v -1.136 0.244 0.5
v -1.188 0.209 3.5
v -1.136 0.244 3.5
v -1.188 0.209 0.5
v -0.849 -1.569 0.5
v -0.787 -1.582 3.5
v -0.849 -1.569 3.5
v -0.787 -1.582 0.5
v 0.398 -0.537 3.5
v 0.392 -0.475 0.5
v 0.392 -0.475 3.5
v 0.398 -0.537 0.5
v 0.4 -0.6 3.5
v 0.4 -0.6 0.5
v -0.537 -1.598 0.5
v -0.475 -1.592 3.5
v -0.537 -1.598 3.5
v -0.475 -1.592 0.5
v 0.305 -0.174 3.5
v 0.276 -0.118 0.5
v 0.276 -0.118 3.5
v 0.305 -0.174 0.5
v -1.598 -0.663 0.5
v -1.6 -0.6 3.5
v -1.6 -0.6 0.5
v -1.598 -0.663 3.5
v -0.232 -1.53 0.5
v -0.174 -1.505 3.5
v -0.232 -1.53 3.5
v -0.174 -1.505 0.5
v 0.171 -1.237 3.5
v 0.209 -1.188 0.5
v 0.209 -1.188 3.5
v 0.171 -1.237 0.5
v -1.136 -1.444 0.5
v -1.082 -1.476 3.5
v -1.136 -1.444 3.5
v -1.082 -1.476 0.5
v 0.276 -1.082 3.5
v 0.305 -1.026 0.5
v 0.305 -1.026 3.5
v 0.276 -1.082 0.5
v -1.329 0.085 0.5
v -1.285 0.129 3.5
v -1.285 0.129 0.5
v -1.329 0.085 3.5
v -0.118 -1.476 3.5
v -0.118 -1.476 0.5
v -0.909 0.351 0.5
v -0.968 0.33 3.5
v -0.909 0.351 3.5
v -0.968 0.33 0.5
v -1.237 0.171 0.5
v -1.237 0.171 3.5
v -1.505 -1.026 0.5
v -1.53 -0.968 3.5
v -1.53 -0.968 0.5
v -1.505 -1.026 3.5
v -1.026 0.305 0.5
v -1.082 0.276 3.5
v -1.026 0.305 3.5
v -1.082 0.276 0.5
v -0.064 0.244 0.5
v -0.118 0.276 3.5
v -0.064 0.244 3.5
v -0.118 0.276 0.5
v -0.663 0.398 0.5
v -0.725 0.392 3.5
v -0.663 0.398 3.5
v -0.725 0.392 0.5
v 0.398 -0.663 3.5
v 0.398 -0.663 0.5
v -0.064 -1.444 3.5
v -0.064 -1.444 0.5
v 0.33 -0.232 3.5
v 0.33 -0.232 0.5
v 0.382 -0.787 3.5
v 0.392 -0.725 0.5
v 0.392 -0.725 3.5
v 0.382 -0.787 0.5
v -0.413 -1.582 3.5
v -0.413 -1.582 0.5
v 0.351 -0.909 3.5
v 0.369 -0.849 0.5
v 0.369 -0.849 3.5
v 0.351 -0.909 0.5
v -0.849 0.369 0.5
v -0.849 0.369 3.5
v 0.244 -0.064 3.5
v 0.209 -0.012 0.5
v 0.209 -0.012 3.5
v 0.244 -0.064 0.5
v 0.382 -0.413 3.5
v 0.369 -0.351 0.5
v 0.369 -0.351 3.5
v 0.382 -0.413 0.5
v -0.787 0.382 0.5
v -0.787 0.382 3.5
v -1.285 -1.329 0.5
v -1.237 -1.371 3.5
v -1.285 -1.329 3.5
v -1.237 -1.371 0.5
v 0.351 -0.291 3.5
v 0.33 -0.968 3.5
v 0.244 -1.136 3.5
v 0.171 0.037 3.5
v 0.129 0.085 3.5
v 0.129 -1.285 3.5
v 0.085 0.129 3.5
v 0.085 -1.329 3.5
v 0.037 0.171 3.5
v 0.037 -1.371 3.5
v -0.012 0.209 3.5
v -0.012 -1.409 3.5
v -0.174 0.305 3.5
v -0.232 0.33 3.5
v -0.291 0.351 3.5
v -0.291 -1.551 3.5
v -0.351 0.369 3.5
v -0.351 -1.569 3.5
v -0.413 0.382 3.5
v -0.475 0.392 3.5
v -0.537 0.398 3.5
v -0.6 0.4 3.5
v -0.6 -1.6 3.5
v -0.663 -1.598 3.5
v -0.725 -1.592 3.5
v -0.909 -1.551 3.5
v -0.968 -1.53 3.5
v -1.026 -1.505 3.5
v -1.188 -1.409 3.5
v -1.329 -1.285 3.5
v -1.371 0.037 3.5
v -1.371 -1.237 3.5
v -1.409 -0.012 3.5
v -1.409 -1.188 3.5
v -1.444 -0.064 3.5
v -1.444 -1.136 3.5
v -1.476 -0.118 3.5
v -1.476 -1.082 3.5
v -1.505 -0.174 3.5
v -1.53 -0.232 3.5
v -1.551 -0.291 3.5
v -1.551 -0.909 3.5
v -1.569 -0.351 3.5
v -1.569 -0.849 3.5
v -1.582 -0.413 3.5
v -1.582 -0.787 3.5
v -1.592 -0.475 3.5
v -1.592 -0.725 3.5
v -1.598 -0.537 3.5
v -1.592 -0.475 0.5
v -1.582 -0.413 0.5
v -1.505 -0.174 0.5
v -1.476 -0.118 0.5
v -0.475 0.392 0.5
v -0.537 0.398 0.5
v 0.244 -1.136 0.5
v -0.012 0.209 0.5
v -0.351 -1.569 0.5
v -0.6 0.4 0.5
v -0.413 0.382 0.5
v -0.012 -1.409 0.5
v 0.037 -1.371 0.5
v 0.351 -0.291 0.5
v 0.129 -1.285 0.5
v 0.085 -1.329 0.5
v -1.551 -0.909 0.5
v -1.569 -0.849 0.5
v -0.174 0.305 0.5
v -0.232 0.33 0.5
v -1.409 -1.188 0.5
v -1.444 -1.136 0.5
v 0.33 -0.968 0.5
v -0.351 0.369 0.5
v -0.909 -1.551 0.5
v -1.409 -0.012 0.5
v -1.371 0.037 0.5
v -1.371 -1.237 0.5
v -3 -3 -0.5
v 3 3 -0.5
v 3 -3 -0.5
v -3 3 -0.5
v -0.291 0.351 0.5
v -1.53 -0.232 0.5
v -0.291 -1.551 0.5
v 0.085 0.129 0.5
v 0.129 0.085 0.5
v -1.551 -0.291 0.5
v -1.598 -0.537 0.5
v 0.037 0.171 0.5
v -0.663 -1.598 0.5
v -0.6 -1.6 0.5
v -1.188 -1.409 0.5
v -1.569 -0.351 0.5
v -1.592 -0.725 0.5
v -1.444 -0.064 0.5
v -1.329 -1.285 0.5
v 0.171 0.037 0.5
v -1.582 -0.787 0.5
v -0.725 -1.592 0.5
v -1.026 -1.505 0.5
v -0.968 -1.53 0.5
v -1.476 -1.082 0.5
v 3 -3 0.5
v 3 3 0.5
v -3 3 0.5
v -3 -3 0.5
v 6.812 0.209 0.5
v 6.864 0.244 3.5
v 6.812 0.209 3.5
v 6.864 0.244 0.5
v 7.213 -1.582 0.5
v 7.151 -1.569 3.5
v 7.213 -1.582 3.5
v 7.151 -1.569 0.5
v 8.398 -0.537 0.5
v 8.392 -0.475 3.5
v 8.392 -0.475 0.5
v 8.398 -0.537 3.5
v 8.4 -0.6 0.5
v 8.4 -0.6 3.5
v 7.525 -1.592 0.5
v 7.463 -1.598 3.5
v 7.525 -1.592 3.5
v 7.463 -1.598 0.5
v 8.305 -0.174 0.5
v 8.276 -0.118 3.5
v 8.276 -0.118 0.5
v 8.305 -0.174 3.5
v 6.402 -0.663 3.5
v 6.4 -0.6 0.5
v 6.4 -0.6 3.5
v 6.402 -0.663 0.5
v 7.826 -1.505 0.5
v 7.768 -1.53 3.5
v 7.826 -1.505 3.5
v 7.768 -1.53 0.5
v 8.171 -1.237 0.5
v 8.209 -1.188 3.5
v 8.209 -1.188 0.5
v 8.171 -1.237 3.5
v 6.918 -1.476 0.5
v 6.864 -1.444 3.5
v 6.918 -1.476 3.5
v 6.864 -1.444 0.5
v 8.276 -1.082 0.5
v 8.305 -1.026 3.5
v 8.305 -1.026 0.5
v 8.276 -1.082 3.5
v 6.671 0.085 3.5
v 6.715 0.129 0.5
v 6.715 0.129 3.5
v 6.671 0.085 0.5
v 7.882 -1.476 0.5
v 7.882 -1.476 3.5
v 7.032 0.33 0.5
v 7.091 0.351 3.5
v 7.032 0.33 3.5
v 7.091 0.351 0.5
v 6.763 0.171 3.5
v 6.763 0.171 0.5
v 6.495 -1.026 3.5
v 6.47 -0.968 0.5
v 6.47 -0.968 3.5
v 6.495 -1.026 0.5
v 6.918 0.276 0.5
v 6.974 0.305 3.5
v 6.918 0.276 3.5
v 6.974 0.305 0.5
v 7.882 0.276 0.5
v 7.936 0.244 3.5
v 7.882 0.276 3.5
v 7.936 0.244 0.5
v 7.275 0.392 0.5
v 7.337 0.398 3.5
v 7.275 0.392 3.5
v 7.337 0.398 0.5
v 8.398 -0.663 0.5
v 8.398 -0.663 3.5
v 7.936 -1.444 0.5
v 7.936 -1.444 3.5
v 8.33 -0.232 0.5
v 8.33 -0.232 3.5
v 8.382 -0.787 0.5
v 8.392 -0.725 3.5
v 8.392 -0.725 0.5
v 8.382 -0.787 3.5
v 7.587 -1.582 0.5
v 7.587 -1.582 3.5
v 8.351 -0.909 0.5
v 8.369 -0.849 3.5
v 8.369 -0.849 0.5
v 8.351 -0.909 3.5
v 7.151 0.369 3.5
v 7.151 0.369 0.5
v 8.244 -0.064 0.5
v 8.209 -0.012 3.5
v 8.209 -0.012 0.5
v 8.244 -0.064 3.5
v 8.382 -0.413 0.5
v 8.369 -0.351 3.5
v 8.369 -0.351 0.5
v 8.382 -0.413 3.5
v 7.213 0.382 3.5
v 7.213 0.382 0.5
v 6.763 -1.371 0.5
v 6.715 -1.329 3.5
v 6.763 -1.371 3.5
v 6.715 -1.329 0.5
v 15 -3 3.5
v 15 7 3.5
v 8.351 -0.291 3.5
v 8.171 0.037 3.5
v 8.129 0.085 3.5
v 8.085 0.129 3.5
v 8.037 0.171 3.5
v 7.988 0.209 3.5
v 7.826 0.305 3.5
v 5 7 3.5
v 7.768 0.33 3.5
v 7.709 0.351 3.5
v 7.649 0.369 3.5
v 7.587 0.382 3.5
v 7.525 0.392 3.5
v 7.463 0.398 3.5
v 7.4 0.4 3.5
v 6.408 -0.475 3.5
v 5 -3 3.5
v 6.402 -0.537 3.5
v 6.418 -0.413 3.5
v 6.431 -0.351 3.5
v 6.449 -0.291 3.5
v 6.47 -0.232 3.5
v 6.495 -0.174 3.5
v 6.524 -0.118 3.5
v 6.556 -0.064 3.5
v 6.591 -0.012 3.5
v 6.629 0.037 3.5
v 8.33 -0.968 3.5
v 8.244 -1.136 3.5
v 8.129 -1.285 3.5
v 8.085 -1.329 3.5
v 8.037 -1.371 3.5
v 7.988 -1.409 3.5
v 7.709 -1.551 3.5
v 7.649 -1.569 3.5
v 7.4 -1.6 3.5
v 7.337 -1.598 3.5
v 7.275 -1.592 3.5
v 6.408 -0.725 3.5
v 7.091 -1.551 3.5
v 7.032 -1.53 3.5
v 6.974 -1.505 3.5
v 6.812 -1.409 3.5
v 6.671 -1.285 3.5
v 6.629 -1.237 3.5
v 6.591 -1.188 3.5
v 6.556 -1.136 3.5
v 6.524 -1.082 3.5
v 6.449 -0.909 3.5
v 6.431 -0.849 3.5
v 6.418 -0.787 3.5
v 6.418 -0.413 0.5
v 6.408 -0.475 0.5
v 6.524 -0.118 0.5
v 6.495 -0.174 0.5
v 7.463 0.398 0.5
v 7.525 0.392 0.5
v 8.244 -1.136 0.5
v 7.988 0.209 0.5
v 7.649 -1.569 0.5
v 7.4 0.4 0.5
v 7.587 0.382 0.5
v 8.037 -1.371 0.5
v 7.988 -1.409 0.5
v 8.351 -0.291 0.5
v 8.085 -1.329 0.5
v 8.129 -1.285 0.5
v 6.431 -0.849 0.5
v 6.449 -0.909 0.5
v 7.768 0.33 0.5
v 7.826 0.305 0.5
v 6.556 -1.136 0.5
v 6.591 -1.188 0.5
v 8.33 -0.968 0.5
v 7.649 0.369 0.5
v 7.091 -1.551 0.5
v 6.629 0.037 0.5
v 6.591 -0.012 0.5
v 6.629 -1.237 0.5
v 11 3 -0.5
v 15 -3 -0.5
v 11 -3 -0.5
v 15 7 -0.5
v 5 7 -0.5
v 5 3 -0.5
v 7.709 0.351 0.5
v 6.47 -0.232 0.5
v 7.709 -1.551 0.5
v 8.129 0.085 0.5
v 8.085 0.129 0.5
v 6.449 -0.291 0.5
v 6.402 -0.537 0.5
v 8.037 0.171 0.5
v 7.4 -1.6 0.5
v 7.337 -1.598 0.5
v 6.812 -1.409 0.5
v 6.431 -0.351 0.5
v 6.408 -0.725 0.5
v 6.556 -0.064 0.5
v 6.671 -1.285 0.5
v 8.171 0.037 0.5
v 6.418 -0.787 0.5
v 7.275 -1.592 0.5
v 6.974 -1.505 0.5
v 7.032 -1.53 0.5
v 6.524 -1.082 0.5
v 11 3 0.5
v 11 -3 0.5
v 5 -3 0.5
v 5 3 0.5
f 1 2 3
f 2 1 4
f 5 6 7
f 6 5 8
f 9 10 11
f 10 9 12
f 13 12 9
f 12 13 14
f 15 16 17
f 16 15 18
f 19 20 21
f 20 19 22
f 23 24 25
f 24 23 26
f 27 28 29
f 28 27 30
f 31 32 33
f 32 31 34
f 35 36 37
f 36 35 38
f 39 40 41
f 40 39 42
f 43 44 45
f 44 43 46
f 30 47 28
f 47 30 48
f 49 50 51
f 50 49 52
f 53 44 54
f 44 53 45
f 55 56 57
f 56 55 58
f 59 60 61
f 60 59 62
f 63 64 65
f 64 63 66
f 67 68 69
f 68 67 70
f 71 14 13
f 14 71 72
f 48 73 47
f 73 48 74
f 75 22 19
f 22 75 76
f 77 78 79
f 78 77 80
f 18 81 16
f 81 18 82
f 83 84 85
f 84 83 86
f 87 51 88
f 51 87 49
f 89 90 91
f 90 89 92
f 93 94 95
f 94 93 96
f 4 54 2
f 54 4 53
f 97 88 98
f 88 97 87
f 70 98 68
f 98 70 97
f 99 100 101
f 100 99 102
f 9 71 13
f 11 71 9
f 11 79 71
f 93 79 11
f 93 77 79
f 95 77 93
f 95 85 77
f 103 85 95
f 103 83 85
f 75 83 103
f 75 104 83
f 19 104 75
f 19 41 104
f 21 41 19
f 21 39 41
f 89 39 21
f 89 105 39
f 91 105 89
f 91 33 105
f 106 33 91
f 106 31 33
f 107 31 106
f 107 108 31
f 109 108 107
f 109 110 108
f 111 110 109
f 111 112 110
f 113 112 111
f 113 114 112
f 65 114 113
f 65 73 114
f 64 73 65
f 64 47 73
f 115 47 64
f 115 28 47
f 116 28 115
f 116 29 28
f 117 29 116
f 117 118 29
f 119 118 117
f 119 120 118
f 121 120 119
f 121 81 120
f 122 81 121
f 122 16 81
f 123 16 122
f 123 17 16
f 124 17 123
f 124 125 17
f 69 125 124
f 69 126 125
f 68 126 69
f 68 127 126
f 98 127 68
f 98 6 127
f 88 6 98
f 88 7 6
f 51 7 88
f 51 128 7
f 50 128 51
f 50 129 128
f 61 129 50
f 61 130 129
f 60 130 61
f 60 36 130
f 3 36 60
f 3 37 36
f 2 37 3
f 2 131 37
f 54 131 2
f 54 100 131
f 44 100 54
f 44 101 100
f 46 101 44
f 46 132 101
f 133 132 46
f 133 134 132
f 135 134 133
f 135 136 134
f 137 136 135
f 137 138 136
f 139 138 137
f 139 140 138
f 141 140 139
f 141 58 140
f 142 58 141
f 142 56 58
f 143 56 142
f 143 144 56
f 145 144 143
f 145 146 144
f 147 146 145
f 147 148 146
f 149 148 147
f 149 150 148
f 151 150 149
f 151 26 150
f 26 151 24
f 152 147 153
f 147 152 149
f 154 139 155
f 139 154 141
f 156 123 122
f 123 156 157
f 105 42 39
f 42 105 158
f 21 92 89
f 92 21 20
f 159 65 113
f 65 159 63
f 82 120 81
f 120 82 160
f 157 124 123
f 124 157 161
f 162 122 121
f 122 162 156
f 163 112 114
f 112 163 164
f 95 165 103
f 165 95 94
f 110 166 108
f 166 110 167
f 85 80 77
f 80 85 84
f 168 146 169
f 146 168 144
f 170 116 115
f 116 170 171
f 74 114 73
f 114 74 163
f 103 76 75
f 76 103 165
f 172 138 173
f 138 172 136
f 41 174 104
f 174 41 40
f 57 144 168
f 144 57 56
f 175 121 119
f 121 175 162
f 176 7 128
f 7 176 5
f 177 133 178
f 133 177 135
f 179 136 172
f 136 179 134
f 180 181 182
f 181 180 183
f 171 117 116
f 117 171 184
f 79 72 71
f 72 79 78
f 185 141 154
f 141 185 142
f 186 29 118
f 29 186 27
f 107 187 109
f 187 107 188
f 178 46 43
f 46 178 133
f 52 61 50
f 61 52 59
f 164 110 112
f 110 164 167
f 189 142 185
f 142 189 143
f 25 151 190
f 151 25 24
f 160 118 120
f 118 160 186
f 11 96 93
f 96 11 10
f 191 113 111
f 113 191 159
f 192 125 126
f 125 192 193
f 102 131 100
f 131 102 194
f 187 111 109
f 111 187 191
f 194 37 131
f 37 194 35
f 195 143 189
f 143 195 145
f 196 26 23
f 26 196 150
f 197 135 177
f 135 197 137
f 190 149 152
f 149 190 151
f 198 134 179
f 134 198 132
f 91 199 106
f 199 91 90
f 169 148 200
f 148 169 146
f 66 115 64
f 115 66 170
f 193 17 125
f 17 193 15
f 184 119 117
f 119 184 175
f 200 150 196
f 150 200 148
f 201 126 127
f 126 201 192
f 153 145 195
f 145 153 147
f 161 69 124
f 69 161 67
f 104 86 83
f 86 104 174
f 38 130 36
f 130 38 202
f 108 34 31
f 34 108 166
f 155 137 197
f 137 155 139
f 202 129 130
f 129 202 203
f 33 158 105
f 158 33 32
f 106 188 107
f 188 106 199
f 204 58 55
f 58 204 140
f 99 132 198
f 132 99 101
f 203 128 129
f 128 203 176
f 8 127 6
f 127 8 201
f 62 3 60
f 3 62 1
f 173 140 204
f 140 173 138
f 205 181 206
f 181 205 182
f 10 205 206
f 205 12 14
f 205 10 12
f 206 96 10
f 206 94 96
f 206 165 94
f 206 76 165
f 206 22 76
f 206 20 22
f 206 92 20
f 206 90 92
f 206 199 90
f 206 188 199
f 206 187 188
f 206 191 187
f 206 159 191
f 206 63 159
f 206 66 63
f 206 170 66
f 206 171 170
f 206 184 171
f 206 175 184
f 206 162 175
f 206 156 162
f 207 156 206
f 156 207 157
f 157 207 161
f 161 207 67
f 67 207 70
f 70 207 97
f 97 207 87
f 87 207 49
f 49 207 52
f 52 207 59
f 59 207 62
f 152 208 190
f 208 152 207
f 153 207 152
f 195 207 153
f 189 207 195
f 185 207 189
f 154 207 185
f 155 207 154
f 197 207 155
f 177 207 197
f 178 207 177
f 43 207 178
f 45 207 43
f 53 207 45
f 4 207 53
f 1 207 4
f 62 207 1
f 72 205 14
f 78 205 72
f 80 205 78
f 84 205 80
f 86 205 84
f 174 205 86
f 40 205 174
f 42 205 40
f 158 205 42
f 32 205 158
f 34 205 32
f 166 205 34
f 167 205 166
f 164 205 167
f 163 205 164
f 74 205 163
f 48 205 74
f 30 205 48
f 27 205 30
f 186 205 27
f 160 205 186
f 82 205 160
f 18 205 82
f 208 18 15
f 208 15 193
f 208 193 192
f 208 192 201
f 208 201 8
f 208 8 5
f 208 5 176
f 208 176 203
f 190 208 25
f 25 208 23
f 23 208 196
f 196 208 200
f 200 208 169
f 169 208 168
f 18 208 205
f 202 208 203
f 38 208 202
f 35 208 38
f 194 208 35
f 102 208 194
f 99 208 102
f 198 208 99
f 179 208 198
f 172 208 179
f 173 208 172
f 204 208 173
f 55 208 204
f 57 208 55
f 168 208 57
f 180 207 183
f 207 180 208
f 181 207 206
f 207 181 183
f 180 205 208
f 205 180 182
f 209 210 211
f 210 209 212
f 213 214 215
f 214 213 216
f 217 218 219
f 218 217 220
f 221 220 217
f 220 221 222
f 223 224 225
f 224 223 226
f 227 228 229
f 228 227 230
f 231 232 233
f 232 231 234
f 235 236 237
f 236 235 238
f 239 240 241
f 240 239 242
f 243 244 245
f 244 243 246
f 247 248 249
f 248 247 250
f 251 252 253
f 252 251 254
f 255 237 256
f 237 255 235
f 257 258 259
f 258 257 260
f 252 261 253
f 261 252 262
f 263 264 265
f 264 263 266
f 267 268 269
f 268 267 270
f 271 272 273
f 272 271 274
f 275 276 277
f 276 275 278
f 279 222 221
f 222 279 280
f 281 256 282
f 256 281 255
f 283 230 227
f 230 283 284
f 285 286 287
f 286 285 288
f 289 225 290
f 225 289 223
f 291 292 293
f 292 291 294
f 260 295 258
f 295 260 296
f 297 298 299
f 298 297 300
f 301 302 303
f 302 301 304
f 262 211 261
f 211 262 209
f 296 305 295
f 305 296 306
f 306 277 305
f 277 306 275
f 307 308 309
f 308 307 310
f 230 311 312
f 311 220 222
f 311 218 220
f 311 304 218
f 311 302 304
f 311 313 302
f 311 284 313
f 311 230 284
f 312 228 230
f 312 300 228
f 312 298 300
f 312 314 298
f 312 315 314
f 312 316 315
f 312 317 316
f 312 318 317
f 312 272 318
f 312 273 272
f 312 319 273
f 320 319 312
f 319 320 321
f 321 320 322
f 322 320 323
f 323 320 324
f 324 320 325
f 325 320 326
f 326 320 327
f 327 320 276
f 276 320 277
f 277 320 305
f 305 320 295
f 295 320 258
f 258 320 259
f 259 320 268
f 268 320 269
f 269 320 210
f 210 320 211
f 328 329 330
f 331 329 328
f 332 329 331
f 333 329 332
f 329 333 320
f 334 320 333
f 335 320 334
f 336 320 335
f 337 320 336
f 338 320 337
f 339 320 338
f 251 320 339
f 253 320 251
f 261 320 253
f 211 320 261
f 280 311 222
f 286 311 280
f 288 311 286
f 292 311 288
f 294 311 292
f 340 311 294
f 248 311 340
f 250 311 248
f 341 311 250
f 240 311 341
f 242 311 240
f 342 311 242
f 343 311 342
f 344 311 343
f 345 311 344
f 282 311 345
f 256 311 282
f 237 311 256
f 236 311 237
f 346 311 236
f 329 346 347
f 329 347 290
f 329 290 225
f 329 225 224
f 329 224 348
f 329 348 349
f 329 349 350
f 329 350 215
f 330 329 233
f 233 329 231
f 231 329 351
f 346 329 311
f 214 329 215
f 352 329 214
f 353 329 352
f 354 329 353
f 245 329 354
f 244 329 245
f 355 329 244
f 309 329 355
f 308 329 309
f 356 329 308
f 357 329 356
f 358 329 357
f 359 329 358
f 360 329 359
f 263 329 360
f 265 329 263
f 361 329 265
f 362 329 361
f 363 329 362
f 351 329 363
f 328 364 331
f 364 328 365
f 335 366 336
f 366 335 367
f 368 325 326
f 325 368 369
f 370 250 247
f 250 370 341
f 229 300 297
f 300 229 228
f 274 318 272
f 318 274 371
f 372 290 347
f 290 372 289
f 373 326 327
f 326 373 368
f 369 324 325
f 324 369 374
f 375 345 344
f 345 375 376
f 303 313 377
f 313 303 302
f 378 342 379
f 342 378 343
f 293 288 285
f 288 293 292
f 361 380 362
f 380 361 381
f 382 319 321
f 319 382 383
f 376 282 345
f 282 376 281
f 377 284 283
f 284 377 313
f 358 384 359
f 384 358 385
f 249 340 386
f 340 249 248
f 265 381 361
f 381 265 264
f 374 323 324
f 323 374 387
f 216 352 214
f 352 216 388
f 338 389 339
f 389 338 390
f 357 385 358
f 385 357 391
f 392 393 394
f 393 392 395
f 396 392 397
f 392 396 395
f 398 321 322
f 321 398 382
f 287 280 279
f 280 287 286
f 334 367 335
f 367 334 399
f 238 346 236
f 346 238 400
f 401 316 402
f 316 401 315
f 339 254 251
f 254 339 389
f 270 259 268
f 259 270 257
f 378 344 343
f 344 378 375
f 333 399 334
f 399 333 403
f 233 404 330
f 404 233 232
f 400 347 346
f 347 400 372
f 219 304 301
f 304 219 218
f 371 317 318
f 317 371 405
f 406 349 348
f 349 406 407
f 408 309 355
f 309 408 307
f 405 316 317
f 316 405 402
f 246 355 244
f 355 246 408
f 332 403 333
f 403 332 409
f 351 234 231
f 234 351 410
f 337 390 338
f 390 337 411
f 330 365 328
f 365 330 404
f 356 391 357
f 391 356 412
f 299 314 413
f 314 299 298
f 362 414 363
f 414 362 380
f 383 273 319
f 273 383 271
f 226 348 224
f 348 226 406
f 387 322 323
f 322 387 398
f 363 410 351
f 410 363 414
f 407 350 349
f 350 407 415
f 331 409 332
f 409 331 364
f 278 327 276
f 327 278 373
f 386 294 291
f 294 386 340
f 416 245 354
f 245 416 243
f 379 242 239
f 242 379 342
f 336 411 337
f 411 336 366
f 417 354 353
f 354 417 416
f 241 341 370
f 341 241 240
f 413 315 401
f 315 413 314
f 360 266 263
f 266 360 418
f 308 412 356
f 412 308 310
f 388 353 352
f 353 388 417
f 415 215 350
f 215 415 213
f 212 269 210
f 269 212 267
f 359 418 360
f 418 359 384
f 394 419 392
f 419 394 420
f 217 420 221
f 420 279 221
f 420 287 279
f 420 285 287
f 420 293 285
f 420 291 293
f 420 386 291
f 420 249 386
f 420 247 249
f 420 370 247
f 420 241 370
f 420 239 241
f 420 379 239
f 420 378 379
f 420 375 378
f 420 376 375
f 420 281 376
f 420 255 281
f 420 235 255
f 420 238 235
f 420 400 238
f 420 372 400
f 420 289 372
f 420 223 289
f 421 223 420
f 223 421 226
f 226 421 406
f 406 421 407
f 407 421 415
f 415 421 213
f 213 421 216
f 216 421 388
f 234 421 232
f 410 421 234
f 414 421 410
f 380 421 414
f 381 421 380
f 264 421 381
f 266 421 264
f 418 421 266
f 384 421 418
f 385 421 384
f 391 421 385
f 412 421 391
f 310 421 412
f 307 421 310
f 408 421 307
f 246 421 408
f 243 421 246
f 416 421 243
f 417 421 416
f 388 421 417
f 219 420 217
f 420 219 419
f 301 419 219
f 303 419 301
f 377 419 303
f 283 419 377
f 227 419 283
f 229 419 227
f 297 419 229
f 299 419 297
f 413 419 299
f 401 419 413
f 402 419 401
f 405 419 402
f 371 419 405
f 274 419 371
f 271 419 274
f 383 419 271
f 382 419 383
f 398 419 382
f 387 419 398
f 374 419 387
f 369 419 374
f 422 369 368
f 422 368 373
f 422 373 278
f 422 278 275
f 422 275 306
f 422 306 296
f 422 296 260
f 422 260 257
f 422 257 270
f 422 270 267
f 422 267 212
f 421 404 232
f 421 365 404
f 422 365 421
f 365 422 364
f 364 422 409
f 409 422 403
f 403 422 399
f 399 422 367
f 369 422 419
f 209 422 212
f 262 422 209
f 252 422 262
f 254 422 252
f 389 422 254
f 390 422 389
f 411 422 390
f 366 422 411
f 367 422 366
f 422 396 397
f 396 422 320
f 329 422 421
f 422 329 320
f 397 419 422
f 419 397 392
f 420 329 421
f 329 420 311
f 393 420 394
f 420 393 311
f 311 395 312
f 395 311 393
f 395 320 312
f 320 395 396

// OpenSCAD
echo(version=version());

module corner() {
    union() {
        translate([-(6 / 2) * 0.2, -(6 / 2) * 0.2, 0.5 + 1]) 
            cylinder(h=4, d=2, center=true, $fn=100);
        cube([6, 6, 1], center=true);
    }
}

module A() {
    difference() { 
        translate([2, 2, 1.5]) 
            cube([10, 10, 4], center=true); 
        corner();
    }
}

translate([8, 0, 0]) color("Red") A();
corner();
